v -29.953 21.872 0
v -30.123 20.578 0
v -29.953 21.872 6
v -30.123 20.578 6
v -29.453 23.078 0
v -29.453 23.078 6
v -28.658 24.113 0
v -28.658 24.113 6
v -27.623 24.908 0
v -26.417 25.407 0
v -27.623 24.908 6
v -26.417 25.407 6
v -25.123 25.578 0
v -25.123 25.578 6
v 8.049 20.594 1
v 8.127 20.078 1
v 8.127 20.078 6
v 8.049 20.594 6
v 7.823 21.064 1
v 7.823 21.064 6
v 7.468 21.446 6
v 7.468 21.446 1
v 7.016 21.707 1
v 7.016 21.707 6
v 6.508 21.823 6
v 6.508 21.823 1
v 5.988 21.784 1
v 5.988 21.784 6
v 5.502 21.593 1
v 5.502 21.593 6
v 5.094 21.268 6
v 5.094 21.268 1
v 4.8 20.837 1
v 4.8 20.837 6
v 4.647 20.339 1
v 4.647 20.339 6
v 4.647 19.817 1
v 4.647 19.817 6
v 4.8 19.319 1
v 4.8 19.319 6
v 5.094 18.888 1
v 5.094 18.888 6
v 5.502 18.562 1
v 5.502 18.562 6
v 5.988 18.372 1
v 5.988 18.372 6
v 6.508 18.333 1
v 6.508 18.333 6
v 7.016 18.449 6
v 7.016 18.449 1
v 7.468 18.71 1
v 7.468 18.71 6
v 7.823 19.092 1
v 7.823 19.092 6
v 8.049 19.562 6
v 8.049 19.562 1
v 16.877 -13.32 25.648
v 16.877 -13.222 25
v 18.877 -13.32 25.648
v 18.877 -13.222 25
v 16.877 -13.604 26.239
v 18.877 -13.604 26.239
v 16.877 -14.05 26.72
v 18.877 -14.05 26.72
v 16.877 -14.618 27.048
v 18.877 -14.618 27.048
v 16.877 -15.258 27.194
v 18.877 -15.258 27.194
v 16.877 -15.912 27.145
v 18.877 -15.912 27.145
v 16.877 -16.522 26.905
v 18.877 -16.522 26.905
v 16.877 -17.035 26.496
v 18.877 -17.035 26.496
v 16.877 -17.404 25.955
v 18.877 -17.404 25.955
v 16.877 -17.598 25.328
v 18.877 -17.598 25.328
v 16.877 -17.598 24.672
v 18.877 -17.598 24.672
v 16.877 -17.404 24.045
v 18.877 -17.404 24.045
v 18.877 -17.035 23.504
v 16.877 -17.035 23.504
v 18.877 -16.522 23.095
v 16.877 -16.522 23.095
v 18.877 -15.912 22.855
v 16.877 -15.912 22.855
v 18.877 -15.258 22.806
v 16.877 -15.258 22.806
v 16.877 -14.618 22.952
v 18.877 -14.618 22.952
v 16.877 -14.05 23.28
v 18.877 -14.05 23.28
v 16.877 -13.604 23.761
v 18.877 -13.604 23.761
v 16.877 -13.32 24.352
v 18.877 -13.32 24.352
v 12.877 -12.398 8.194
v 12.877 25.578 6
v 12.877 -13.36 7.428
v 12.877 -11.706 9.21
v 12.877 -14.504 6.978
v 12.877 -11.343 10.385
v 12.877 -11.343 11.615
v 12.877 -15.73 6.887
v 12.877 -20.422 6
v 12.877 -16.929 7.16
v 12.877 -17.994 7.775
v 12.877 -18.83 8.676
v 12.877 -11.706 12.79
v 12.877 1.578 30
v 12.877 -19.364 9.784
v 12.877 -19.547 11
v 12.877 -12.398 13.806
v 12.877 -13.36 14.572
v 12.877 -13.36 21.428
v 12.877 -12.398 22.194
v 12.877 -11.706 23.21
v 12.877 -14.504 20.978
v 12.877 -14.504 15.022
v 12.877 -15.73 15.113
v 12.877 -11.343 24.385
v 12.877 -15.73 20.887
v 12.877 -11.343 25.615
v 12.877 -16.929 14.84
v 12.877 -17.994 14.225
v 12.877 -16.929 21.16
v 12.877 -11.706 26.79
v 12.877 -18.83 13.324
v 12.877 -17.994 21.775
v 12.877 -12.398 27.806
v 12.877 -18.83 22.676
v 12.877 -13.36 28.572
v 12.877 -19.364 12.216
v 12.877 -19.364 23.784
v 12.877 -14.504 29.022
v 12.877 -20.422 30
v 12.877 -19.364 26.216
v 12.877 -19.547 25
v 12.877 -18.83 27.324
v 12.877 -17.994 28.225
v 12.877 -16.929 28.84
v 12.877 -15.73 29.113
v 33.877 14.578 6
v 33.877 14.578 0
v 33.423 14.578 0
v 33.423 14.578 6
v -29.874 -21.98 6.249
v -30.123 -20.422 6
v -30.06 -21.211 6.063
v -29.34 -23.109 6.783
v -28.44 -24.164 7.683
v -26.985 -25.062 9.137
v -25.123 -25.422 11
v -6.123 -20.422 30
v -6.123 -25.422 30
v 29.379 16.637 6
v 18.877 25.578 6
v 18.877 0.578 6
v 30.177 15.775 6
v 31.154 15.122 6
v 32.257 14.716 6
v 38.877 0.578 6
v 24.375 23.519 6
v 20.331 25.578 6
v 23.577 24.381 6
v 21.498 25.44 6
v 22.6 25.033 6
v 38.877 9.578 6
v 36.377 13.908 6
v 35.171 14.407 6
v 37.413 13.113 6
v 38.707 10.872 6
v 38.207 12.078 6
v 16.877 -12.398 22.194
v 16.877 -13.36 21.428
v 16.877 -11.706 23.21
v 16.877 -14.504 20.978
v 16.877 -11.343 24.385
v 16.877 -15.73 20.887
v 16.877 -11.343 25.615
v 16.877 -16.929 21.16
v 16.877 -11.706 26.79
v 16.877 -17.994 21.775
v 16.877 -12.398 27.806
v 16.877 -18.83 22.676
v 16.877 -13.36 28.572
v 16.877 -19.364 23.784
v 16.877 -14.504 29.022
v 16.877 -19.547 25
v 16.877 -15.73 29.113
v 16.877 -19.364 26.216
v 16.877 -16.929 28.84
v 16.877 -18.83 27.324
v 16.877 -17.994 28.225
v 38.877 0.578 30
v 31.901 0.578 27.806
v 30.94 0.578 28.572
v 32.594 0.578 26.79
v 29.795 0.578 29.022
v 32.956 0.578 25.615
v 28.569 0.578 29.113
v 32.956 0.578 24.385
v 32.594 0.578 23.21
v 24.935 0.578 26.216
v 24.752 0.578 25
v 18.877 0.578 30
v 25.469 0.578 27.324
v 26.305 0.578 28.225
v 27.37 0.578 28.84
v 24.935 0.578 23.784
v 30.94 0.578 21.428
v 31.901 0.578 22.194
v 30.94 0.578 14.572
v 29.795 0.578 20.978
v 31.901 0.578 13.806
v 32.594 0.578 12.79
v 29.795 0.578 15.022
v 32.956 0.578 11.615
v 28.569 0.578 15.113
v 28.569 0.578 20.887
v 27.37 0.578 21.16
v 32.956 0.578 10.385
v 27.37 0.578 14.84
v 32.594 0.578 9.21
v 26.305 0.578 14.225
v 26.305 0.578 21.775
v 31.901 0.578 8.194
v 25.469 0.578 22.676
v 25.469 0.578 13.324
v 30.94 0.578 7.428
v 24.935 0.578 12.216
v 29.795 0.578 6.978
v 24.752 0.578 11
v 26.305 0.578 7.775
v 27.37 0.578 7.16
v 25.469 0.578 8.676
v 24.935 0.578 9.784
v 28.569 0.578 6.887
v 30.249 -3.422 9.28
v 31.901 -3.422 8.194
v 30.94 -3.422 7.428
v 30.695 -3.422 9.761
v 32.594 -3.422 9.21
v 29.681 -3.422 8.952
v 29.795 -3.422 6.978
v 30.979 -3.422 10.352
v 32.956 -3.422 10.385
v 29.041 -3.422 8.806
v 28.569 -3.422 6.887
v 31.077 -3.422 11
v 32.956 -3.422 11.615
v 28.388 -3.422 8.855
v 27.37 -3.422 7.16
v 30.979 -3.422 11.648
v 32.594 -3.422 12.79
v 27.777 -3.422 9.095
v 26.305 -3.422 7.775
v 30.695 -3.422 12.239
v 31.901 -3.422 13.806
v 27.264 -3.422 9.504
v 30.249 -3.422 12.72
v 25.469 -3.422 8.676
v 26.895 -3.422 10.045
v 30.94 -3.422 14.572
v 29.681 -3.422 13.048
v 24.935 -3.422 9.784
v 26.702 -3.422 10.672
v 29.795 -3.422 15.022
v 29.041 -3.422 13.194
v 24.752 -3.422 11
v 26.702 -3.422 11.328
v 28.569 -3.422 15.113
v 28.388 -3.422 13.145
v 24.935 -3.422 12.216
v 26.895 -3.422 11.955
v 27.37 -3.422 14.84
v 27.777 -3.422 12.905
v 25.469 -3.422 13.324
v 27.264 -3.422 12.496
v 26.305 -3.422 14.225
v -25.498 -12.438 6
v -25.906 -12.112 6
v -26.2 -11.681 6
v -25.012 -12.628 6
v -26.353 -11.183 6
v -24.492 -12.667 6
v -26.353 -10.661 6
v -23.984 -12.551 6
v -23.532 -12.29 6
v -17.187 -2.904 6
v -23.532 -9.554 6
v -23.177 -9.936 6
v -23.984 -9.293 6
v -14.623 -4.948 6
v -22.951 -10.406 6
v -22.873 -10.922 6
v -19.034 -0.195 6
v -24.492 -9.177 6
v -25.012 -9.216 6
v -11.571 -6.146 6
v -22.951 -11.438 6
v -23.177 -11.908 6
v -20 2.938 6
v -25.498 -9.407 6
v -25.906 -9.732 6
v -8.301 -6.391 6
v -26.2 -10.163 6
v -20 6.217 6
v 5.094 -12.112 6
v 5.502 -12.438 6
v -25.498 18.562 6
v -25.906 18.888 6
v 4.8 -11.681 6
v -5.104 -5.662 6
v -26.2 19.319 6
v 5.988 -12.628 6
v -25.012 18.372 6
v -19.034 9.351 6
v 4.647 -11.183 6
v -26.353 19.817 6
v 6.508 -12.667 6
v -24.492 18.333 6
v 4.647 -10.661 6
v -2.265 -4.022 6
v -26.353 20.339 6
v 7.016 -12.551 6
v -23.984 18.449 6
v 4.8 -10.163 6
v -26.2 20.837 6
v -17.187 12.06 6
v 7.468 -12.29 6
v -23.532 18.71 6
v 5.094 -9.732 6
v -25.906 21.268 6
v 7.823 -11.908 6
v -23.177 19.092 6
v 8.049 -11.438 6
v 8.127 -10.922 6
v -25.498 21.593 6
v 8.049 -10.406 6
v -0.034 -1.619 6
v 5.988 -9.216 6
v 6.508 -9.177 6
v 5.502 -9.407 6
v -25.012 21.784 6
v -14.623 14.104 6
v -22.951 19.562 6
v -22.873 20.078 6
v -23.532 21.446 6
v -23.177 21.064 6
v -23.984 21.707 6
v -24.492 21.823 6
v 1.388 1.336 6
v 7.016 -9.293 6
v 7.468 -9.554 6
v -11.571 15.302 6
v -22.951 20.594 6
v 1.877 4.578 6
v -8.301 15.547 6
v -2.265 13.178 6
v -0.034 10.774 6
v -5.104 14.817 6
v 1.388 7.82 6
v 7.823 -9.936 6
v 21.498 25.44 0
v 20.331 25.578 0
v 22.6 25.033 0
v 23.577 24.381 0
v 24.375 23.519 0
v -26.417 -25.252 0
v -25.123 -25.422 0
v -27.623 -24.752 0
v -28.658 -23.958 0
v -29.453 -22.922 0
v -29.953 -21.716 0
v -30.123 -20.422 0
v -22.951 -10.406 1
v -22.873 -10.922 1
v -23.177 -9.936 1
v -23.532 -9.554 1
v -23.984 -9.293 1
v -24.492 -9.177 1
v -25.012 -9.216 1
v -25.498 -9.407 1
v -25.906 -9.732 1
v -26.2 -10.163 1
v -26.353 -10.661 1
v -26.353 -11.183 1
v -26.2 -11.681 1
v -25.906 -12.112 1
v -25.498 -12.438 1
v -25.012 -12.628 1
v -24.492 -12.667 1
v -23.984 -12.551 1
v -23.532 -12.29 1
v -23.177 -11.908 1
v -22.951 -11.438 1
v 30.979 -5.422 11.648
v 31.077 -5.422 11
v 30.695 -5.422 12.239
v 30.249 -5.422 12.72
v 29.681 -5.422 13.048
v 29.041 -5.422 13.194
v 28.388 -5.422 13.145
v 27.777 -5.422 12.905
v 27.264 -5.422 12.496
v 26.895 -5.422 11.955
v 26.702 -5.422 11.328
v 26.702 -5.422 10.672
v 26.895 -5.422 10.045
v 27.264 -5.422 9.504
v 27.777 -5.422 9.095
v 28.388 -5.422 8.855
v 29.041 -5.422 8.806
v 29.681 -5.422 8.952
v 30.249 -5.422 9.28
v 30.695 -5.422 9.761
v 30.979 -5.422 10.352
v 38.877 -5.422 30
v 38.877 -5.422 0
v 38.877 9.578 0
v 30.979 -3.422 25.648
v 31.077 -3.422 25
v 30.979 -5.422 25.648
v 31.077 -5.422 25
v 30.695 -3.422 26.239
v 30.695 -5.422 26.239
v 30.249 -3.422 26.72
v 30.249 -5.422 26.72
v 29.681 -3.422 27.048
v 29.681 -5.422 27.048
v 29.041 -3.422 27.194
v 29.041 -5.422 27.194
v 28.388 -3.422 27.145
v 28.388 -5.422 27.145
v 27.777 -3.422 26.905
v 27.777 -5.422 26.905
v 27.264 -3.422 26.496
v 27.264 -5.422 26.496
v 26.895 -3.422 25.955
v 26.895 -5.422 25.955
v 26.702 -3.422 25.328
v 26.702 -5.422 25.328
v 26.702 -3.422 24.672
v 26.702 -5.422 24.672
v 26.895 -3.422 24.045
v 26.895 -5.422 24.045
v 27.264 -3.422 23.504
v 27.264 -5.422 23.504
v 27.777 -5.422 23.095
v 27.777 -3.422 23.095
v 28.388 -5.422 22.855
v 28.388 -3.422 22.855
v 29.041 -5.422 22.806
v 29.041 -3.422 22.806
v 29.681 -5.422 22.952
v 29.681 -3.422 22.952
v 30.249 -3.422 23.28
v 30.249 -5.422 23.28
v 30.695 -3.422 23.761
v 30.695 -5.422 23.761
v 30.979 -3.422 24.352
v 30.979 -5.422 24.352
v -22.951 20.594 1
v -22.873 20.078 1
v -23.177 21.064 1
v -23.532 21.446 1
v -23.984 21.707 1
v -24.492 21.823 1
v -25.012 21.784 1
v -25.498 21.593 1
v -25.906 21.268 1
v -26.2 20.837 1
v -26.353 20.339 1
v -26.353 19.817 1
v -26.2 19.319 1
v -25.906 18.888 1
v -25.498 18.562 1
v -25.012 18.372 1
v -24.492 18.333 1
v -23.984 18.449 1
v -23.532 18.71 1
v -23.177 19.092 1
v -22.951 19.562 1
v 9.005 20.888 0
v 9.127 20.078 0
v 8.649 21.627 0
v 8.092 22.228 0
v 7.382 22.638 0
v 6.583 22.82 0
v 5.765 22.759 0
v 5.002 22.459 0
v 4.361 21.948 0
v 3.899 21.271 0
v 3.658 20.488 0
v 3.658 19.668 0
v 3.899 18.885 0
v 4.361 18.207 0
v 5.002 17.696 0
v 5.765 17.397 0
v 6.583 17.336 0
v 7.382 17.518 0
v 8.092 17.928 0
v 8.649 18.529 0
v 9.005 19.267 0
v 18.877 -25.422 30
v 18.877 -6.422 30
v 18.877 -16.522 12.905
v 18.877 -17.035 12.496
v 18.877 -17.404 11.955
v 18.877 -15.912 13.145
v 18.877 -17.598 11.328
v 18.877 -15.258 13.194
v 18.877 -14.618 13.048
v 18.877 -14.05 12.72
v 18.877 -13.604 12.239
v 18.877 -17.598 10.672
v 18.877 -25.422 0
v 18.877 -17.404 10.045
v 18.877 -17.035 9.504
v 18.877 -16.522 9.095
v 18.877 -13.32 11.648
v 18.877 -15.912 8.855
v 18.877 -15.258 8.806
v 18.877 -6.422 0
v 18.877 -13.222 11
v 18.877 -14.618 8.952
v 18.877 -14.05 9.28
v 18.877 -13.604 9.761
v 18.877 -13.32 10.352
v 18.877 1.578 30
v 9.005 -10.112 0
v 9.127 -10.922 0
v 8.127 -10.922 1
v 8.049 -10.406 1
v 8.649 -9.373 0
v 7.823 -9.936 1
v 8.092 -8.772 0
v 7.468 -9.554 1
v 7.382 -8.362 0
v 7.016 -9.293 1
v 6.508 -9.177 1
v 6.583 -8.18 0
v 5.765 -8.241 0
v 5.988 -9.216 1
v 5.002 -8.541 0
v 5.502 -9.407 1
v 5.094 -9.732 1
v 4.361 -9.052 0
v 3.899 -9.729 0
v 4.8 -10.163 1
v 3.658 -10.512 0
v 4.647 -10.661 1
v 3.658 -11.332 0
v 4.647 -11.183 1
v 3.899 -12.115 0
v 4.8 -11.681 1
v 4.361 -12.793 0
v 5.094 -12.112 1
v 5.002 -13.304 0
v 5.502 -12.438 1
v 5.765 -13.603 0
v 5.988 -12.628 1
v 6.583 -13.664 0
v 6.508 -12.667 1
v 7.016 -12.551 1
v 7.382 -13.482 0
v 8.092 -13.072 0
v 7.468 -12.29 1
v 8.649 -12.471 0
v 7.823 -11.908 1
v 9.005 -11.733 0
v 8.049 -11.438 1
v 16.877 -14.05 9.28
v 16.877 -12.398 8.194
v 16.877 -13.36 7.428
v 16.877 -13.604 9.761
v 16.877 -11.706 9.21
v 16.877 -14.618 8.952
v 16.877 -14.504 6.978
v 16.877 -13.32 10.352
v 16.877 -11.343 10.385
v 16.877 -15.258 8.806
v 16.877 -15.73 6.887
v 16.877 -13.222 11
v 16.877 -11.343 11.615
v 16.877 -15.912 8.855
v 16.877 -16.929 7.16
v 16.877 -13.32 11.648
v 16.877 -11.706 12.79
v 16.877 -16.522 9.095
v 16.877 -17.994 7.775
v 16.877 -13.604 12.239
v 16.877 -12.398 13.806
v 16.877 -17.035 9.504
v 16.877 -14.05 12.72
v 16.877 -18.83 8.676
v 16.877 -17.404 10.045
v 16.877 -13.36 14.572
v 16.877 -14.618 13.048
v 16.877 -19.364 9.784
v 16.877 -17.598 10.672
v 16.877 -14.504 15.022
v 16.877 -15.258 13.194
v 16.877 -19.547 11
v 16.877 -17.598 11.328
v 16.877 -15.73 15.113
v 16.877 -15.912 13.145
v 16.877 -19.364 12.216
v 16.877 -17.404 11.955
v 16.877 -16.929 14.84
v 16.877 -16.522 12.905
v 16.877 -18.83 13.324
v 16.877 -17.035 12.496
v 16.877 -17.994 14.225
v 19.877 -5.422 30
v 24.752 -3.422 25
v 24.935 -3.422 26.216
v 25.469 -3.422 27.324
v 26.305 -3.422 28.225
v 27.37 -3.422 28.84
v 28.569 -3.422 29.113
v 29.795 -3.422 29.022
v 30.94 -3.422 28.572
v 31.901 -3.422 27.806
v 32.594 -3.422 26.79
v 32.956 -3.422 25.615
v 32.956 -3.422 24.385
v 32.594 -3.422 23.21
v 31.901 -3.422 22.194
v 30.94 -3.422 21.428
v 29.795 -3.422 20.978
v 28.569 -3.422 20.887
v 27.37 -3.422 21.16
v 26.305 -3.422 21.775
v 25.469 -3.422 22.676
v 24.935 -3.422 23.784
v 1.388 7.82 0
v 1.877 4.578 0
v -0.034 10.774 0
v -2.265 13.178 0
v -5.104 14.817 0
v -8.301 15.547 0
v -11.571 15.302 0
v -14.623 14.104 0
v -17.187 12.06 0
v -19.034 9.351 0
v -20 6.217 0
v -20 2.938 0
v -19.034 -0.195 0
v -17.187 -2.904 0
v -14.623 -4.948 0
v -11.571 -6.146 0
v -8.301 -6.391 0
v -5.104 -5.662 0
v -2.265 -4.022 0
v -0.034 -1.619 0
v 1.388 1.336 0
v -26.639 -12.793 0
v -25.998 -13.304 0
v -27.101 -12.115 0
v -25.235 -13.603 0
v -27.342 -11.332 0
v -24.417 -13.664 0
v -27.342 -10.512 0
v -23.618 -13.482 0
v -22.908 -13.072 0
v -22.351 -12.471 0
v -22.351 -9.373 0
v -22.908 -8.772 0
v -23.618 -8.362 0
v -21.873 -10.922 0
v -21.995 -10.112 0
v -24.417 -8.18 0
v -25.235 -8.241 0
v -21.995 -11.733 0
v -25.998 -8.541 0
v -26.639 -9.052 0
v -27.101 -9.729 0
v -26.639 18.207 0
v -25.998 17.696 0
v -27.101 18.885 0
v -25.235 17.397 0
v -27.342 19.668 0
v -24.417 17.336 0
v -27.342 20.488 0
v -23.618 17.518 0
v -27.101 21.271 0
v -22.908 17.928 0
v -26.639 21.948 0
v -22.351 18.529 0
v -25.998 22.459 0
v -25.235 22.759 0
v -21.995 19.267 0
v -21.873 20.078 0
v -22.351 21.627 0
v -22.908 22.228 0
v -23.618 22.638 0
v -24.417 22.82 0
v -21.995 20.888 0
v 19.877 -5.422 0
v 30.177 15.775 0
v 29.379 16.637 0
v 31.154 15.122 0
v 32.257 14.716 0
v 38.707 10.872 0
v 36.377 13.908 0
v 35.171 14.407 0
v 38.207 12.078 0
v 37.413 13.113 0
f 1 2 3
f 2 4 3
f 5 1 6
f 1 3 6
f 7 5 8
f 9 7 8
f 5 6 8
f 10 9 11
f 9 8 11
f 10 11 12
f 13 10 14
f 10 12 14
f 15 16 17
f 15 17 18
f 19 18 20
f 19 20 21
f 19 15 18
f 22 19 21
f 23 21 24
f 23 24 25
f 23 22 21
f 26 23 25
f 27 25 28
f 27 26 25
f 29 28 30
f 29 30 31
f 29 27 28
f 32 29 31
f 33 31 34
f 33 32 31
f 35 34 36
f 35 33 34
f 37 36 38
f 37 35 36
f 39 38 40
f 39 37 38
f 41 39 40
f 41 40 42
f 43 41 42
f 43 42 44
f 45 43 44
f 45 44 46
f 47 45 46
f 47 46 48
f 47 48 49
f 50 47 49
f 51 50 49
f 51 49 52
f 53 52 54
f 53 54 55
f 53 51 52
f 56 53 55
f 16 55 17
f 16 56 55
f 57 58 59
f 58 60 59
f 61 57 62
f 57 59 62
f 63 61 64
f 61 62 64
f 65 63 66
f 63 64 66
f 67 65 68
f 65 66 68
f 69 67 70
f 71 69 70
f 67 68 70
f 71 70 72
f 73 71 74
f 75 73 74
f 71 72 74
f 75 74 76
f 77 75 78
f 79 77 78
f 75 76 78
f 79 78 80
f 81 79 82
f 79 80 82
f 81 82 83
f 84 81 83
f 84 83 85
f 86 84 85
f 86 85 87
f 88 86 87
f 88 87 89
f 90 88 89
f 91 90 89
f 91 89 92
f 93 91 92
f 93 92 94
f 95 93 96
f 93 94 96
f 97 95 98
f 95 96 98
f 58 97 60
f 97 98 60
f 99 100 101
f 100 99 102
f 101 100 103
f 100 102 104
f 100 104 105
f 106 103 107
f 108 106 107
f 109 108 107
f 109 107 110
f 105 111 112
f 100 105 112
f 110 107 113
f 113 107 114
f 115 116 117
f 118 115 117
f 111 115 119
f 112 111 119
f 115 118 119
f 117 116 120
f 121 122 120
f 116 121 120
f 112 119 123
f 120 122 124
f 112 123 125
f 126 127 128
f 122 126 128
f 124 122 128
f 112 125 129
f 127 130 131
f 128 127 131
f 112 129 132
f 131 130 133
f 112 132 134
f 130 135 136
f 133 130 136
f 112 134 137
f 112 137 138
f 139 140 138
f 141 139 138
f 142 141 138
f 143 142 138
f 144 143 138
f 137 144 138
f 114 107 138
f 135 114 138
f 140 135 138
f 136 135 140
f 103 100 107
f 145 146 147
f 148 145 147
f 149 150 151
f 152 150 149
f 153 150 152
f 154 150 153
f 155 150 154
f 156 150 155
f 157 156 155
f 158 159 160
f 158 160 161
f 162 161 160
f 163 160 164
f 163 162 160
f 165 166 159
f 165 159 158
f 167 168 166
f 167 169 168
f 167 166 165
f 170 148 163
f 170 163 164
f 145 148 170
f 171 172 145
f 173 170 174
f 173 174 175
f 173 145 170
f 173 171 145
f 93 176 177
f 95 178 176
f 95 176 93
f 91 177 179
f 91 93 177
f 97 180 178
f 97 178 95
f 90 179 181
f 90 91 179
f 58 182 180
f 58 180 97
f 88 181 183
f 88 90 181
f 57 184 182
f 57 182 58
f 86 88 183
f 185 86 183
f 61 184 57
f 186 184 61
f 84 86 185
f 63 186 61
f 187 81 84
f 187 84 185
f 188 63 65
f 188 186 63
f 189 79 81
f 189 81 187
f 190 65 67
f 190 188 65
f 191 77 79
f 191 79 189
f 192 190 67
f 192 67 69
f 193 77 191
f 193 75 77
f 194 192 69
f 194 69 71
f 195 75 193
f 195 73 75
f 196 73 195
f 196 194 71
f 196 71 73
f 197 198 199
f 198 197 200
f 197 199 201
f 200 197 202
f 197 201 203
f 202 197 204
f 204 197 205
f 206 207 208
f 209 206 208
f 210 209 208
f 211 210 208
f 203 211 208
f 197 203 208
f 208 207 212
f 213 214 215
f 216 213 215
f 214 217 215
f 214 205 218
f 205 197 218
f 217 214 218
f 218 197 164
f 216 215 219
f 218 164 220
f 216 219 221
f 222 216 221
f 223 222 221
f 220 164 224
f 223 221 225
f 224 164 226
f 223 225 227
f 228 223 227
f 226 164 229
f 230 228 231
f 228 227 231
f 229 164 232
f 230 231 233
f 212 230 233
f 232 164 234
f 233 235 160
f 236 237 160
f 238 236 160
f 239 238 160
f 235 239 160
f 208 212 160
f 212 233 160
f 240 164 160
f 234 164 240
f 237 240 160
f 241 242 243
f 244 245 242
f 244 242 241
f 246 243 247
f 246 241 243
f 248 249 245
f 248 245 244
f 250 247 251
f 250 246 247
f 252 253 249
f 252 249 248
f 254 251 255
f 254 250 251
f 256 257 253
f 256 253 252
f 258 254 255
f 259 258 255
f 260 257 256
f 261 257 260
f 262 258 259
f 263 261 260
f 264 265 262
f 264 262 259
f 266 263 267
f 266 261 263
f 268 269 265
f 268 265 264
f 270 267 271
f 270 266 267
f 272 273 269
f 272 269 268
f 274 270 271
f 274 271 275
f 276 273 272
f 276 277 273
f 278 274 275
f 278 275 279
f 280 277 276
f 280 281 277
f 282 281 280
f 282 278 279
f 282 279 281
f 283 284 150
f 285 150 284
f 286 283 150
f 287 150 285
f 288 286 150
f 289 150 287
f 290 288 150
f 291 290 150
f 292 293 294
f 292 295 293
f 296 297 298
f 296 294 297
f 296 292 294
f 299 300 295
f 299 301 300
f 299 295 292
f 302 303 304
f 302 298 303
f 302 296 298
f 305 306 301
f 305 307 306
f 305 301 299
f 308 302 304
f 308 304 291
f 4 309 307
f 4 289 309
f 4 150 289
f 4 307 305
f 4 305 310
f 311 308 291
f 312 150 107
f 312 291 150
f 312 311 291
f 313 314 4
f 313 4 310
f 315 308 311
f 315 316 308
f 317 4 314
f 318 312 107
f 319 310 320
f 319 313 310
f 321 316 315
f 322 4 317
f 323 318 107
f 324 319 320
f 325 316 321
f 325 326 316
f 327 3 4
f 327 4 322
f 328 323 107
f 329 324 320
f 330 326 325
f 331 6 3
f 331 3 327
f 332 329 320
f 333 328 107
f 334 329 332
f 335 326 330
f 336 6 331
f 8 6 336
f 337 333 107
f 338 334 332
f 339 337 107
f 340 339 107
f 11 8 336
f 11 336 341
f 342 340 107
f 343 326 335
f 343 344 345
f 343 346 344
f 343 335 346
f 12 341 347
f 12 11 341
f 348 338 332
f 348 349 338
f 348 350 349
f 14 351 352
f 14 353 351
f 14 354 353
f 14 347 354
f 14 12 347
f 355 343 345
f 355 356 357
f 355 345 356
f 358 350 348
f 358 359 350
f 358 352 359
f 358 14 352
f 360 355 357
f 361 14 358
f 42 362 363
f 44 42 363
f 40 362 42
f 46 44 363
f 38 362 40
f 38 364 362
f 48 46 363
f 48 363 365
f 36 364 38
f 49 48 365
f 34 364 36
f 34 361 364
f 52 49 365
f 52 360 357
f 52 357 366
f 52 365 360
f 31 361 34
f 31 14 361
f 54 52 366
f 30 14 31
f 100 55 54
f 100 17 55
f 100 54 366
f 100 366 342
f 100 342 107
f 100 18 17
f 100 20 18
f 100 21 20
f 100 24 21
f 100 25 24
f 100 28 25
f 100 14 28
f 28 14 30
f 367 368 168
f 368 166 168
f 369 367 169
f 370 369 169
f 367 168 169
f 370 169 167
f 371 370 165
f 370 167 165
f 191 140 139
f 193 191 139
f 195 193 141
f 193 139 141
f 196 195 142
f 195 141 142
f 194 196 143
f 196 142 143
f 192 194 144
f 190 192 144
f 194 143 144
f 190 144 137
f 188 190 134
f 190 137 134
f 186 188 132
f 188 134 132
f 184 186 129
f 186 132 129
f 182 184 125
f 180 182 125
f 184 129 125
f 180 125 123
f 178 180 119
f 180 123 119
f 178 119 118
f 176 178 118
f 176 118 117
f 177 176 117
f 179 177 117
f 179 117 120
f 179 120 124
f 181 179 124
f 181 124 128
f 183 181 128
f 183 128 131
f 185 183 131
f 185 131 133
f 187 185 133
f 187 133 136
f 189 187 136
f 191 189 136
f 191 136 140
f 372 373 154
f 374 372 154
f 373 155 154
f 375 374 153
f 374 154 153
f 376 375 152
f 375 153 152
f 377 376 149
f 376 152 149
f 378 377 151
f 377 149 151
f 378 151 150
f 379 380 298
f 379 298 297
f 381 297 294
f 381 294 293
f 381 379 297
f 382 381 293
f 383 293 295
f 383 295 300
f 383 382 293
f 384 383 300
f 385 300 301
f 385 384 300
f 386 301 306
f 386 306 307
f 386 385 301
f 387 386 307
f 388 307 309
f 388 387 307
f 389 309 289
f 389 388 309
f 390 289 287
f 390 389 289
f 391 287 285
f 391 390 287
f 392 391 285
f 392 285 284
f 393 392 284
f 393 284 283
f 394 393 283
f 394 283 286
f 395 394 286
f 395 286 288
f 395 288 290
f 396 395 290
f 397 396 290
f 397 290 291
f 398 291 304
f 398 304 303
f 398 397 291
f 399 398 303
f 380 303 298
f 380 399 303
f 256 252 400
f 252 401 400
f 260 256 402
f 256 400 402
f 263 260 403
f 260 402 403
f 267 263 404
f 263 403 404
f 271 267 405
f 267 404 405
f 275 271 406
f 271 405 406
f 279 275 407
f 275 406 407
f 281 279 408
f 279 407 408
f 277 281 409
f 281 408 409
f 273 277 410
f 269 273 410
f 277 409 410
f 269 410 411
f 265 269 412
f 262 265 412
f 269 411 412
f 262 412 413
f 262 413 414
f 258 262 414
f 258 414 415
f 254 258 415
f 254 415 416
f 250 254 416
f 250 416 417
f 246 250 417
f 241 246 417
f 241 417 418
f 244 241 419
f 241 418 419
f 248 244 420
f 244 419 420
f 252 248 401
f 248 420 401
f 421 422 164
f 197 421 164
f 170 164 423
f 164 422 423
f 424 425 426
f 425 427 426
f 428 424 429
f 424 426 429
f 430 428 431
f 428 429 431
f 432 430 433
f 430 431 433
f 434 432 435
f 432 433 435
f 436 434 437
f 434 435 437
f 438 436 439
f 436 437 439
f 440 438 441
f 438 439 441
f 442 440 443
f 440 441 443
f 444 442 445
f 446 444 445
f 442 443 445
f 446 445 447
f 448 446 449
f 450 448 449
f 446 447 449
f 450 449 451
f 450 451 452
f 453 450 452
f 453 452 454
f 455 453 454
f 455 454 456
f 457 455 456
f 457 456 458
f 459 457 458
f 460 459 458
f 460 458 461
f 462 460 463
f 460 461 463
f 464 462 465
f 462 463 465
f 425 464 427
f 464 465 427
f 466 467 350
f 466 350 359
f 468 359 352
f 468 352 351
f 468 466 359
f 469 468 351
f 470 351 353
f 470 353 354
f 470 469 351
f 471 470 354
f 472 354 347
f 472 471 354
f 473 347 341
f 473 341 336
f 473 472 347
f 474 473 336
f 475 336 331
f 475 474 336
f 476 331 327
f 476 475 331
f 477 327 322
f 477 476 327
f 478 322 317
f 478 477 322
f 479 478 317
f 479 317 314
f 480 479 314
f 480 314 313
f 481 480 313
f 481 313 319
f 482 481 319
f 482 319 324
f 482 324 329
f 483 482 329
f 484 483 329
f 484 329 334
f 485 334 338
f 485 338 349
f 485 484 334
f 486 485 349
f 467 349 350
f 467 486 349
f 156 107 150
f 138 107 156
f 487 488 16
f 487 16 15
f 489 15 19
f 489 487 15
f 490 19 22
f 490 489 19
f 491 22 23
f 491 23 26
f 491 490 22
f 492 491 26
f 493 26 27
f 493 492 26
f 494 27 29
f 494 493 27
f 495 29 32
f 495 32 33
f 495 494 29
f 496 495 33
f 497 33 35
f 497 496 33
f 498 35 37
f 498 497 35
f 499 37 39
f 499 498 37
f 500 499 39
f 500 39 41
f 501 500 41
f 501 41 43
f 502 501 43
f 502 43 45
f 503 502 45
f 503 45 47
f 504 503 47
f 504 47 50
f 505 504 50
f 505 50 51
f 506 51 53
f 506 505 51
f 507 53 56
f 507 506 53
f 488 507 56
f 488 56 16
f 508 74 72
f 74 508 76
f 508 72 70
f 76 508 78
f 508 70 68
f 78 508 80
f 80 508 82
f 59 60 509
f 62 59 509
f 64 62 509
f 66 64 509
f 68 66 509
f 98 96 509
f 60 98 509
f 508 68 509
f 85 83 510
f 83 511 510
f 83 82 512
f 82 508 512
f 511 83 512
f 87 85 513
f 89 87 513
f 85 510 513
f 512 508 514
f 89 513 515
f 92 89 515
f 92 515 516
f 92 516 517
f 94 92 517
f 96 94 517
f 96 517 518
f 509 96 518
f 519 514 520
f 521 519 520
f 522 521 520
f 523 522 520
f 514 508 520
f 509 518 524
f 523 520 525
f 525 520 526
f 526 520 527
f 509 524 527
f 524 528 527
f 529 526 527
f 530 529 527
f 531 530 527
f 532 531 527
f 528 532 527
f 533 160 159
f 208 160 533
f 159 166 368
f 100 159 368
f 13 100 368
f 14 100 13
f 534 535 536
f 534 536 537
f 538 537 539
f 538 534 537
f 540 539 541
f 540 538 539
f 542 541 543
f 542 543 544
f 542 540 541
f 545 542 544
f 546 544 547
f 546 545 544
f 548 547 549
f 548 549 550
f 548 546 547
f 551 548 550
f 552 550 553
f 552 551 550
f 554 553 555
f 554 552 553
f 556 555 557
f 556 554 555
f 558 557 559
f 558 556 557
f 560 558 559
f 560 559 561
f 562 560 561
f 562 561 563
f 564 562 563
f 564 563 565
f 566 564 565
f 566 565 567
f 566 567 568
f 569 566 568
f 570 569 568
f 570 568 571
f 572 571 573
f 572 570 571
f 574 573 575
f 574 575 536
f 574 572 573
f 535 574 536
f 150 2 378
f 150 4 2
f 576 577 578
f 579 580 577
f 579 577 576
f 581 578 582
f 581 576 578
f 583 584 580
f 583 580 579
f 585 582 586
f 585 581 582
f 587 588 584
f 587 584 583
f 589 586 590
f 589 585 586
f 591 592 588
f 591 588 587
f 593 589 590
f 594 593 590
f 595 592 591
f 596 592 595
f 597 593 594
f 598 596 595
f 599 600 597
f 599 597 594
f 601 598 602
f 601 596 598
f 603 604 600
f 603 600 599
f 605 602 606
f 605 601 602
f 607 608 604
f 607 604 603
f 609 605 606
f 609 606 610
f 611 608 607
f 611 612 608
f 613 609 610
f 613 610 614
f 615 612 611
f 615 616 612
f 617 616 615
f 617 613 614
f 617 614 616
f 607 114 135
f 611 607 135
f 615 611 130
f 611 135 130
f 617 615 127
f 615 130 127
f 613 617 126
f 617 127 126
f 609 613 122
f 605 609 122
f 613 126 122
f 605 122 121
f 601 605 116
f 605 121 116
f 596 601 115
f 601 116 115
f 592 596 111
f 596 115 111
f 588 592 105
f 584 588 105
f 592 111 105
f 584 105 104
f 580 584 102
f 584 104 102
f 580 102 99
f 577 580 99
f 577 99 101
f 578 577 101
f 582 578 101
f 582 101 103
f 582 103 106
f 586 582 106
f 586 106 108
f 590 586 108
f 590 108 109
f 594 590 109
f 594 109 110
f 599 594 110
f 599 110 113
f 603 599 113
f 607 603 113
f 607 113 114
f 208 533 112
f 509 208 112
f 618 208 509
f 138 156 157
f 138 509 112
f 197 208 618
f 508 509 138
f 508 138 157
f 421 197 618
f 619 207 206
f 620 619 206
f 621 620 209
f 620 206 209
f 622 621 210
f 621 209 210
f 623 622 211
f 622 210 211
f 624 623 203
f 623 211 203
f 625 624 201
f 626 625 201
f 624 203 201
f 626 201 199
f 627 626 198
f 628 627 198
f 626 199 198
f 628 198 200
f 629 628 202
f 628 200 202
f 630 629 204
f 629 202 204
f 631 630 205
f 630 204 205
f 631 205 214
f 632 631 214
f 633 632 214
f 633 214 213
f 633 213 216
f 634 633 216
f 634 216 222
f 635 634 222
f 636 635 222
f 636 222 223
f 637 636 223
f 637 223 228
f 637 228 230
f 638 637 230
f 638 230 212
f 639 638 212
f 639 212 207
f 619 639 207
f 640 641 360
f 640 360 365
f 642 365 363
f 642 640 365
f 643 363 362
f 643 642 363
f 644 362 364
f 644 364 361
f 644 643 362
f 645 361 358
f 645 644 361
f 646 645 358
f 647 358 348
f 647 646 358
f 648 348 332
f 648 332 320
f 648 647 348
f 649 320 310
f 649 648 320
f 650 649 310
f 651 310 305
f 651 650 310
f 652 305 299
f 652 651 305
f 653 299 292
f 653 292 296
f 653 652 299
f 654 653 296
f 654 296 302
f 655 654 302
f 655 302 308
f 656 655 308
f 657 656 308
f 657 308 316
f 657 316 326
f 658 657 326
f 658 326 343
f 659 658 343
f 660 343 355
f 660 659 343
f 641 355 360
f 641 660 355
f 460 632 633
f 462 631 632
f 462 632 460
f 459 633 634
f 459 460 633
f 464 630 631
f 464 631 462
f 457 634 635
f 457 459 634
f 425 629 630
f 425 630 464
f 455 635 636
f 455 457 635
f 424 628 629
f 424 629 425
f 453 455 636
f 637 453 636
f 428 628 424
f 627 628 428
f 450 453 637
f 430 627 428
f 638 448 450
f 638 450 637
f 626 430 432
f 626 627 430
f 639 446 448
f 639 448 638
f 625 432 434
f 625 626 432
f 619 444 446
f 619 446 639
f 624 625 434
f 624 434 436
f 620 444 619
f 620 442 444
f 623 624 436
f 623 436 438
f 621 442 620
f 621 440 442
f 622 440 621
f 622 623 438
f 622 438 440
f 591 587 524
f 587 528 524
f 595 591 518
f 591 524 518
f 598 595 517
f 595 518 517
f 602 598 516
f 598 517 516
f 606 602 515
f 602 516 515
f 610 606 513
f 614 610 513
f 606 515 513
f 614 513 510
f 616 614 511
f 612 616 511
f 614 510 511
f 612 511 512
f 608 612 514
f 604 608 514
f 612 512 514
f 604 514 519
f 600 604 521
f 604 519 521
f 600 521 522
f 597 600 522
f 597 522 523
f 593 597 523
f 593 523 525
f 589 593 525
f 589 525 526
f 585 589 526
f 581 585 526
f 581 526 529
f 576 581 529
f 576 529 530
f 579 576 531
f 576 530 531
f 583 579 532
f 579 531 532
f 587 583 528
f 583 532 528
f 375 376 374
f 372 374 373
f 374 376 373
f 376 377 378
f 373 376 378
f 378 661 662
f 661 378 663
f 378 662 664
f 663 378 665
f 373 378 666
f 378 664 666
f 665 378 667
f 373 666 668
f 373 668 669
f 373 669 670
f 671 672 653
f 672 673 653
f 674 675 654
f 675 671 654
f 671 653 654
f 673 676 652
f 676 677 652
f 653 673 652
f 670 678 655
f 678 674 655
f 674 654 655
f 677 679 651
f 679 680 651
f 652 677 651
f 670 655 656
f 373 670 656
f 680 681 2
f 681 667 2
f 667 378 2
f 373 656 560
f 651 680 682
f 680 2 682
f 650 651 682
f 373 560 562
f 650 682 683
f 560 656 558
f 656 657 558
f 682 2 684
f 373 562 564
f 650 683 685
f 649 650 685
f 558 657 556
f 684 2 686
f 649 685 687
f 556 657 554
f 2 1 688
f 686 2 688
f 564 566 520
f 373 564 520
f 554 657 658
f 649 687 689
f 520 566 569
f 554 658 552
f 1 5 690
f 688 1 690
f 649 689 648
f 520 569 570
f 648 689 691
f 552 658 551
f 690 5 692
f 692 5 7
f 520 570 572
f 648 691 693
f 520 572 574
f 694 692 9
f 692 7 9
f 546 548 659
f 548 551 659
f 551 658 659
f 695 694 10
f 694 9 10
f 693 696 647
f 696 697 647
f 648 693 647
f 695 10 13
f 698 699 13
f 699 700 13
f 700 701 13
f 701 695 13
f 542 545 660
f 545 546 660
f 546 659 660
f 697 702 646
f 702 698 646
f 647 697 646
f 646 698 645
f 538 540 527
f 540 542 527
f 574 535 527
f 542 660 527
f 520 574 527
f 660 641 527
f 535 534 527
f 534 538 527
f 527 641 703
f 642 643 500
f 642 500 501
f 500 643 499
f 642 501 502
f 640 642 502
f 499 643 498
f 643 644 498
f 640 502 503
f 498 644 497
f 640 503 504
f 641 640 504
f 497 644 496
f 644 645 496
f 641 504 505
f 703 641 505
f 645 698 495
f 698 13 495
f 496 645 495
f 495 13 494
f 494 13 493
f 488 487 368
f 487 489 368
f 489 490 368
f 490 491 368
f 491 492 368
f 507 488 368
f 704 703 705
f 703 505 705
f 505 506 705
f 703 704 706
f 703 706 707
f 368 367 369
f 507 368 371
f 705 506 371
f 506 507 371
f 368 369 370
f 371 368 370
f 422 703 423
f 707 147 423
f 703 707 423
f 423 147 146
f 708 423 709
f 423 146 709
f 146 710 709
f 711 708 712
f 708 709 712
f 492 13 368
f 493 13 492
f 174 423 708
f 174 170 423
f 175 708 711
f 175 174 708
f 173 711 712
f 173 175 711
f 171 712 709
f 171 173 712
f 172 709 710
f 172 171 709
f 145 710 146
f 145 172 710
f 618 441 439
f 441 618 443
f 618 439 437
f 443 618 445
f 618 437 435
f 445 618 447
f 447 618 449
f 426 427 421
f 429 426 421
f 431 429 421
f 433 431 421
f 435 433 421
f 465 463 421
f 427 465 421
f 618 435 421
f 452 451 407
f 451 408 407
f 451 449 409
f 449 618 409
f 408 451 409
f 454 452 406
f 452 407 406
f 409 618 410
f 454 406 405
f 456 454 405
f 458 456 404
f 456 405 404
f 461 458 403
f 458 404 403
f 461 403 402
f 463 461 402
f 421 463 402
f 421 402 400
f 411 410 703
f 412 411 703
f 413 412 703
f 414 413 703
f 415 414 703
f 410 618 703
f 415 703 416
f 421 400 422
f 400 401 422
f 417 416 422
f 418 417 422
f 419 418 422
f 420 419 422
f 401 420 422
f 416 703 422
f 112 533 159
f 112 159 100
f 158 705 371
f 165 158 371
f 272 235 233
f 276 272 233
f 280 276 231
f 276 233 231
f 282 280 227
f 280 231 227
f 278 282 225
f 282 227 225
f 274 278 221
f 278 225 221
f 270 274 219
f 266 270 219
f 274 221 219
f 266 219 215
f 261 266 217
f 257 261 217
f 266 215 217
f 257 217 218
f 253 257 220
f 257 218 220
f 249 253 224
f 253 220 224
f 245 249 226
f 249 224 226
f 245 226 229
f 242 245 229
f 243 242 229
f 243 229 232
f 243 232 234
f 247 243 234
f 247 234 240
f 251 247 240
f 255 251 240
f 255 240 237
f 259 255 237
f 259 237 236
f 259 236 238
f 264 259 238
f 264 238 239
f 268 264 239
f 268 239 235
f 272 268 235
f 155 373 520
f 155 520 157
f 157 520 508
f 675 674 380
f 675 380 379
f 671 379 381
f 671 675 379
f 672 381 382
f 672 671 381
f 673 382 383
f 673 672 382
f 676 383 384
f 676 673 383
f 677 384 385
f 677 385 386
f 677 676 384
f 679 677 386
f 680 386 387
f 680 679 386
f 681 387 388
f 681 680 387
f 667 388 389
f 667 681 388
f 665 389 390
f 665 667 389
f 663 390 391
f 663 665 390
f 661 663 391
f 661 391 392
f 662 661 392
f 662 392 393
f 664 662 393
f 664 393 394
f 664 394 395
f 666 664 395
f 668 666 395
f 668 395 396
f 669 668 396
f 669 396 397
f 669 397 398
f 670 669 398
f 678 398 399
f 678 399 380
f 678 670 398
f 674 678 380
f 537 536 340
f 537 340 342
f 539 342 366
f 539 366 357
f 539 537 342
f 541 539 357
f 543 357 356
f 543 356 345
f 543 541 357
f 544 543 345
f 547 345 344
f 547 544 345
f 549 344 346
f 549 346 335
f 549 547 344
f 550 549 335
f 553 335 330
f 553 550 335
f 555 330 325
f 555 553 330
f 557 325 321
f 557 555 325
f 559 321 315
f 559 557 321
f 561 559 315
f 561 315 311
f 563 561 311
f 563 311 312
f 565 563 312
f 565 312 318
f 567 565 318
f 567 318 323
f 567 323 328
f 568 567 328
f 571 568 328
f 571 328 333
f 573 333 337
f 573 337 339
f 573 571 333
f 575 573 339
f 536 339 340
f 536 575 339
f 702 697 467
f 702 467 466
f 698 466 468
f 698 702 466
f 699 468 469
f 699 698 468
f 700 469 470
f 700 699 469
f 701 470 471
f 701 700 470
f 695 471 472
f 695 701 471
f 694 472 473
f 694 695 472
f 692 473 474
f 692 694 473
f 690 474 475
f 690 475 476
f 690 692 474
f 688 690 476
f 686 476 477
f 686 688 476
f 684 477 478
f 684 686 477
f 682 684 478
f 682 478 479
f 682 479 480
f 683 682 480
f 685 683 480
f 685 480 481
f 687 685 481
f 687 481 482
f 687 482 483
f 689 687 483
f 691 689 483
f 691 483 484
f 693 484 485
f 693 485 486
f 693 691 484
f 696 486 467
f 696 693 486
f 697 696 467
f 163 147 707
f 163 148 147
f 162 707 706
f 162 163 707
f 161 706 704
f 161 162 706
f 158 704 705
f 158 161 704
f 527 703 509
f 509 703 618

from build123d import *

# Parameters (mm, degrees)
F0_R            = 1.75
F0_R_2          = 11
F1_DEPTH        = 6
F2_SIZE         = 1
F4_DEPTH        = 24
F5_DEPTH        = 10
F6_SIZE         = 1
F8_D            = 4.4
F8_CBORE_D      = 8.25
F8_CBORE_DEPTH  = 4
F10_D           = 4.4
F10_CBORE_D     = 8.25
F10_CBORE_DEPTH = 4
F11_W           = 6
F11_H           = 24
F12_DEPTH       = 25
F13_W           = 5
F13_H           = 24
F14_DEPTH       = 43
F15_SIZE        = 24
F16_R           = 5


with BuildPart() as f1:
    # F0 (on Top) → F1 (new body)
    with BuildSketch(Plane.XY):
        Polygon((18.8770524859, 25.5778683759), (-30.1229475141, 25.5778683759), (-30.1229475141, -25.4221316241), (18.8770524859, -25.4221316241), (18.8770524859, -5.4221316241), align=None)
        with Locations((-24.6229475141, -10.9221316241)):
            Circle(F0_R, mode=Mode.SUBTRACT)
        with Locations((6.3770524859, -10.9221316241)):
            Circle(F0_R, mode=Mode.SUBTRACT)
        with Locations((-9.1229475141, 4.5778683759)):
            Circle(F0_R_2, mode=Mode.SUBTRACT)
        with Locations((-24.6229475141, 20.0778683759)):
            Circle(F0_R, mode=Mode.SUBTRACT)
        with Locations((6.3770524859, 20.0778683759)):
            Circle(F0_R, mode=Mode.SUBTRACT)
        Polygon((22.8770524859, 25.5778683759), (18.8770524859, 25.5778683759), (18.8770524859, -5.4221316241), (38.8770524859, -5.4221316241), (38.8770524859, 14.5778683759), (30.8770524859, 14.5778683759), align=None)
    extrude(amount=F1_DEPTH)

    # F2
    f2_edges = [f1.edges().sort_by_distance(p)[0] for p in [
        (-26.372948, 20.077868, 0),
        (4.627052, 20.077868, 0),
        (4.627052, -10.922132, 0),
        (-26.372948, -10.922132, 0),
    ]]
    chamfer(f2_edges, length=F2_SIZE)

    # F3 (on face) → F4 (join)
    with BuildSketch(Plane.XY.offset(6)):
        Polygon((18.8770524859, -25.4221316241), (18.8770524859, -5.4221316241), (38.8770524859, -5.4221316241), (38.8770524859, 0.5778683759), (12.8770524859, 0.5778683759), (12.8770524859, -25.4221316241), align=None)
    extrude(amount=F4_DEPTH)

    # F3 (on face) → F5 (join)
    with BuildSketch(Plane.XY.offset(6)):
        Polygon((18.8770524859, -25.4221316241), (18.8770524859, -5.4221316241), (38.8770524859, -5.4221316241), (38.8770524859, 0.5778683759), (12.8770524859, 0.5778683759), (12.8770524859, -25.4221316241), align=None)
    extrude(amount=F5_DEPTH)

    # F6
    f6_edges = [f1.edges().sort_by_distance(p)[0] for p in [
        (18.877052, -5.422132, 15),
    ]]
    chamfer(f6_edges, length=F6_SIZE)

    # F8 (through all)
    with Locations(Plane(origin=(0, 0.5778683759, 0), x_dir=(-1, 0, 0), z_dir=(0, 1, 0))):
        with Locations((-28.8770524859, 25), (-28.8770524859, 11)):
            CounterBoreHole(F8_D / 2, F8_CBORE_D / 2, F8_CBORE_DEPTH)

    # F10 (through all)
    with Locations(Plane(origin=(12.8770524859, 0, 0), x_dir=(0, -1, 0), z_dir=(-1, 0, 0))):
        with Locations((15.4221316241, 25), (15.4221316241, 11)):
            CounterBoreHole(F10_D / 2, F10_CBORE_D / 2, F10_CBORE_DEPTH)

    # F11 (on face) → F12 (join, through all)
    with BuildSketch(Plane(origin=(0, 0.5778683759, 0), x_dir=(-1, 0, 0), z_dir=(0, 1, 0))):
        with Locations((-15.8770524859, 18)):
            Rectangle(F11_W, F11_H)
    extrude(amount=F12_DEPTH)

    # F13 (on face) → F14 (join, through all)
    with BuildSketch(Plane(origin=(12.8770524859, 0, 0), x_dir=(0, -1, 0), z_dir=(-1, 0, 0))):
        with Locations((22.9221316241, 18)):
            Rectangle(F13_W, F13_H)
    extrude(amount=F14_DEPTH)

    # F15
    f15_edges = [f1.edges().sort_by_distance(p)[0] for p in [
        (-30.122948, -22.922132, 30),
        (15.877052, 25.577868, 30),
    ]]
    chamfer(f15_edges, length=F15_SIZE)

    # F16
    f16_edges = [f1.edges().sort_by_distance(p)[0] for p in [
        (30.877052, 14.577868, 3),
        (22.877052, 25.577868, 3),
        (38.877052, 14.577868, 3),
        (-30.122948, -25.422132, 3),
        (-30.122948, 25.577868, 3),
    ]]
    fillet(f16_edges, radius=F16_R)


solid = f1.part
